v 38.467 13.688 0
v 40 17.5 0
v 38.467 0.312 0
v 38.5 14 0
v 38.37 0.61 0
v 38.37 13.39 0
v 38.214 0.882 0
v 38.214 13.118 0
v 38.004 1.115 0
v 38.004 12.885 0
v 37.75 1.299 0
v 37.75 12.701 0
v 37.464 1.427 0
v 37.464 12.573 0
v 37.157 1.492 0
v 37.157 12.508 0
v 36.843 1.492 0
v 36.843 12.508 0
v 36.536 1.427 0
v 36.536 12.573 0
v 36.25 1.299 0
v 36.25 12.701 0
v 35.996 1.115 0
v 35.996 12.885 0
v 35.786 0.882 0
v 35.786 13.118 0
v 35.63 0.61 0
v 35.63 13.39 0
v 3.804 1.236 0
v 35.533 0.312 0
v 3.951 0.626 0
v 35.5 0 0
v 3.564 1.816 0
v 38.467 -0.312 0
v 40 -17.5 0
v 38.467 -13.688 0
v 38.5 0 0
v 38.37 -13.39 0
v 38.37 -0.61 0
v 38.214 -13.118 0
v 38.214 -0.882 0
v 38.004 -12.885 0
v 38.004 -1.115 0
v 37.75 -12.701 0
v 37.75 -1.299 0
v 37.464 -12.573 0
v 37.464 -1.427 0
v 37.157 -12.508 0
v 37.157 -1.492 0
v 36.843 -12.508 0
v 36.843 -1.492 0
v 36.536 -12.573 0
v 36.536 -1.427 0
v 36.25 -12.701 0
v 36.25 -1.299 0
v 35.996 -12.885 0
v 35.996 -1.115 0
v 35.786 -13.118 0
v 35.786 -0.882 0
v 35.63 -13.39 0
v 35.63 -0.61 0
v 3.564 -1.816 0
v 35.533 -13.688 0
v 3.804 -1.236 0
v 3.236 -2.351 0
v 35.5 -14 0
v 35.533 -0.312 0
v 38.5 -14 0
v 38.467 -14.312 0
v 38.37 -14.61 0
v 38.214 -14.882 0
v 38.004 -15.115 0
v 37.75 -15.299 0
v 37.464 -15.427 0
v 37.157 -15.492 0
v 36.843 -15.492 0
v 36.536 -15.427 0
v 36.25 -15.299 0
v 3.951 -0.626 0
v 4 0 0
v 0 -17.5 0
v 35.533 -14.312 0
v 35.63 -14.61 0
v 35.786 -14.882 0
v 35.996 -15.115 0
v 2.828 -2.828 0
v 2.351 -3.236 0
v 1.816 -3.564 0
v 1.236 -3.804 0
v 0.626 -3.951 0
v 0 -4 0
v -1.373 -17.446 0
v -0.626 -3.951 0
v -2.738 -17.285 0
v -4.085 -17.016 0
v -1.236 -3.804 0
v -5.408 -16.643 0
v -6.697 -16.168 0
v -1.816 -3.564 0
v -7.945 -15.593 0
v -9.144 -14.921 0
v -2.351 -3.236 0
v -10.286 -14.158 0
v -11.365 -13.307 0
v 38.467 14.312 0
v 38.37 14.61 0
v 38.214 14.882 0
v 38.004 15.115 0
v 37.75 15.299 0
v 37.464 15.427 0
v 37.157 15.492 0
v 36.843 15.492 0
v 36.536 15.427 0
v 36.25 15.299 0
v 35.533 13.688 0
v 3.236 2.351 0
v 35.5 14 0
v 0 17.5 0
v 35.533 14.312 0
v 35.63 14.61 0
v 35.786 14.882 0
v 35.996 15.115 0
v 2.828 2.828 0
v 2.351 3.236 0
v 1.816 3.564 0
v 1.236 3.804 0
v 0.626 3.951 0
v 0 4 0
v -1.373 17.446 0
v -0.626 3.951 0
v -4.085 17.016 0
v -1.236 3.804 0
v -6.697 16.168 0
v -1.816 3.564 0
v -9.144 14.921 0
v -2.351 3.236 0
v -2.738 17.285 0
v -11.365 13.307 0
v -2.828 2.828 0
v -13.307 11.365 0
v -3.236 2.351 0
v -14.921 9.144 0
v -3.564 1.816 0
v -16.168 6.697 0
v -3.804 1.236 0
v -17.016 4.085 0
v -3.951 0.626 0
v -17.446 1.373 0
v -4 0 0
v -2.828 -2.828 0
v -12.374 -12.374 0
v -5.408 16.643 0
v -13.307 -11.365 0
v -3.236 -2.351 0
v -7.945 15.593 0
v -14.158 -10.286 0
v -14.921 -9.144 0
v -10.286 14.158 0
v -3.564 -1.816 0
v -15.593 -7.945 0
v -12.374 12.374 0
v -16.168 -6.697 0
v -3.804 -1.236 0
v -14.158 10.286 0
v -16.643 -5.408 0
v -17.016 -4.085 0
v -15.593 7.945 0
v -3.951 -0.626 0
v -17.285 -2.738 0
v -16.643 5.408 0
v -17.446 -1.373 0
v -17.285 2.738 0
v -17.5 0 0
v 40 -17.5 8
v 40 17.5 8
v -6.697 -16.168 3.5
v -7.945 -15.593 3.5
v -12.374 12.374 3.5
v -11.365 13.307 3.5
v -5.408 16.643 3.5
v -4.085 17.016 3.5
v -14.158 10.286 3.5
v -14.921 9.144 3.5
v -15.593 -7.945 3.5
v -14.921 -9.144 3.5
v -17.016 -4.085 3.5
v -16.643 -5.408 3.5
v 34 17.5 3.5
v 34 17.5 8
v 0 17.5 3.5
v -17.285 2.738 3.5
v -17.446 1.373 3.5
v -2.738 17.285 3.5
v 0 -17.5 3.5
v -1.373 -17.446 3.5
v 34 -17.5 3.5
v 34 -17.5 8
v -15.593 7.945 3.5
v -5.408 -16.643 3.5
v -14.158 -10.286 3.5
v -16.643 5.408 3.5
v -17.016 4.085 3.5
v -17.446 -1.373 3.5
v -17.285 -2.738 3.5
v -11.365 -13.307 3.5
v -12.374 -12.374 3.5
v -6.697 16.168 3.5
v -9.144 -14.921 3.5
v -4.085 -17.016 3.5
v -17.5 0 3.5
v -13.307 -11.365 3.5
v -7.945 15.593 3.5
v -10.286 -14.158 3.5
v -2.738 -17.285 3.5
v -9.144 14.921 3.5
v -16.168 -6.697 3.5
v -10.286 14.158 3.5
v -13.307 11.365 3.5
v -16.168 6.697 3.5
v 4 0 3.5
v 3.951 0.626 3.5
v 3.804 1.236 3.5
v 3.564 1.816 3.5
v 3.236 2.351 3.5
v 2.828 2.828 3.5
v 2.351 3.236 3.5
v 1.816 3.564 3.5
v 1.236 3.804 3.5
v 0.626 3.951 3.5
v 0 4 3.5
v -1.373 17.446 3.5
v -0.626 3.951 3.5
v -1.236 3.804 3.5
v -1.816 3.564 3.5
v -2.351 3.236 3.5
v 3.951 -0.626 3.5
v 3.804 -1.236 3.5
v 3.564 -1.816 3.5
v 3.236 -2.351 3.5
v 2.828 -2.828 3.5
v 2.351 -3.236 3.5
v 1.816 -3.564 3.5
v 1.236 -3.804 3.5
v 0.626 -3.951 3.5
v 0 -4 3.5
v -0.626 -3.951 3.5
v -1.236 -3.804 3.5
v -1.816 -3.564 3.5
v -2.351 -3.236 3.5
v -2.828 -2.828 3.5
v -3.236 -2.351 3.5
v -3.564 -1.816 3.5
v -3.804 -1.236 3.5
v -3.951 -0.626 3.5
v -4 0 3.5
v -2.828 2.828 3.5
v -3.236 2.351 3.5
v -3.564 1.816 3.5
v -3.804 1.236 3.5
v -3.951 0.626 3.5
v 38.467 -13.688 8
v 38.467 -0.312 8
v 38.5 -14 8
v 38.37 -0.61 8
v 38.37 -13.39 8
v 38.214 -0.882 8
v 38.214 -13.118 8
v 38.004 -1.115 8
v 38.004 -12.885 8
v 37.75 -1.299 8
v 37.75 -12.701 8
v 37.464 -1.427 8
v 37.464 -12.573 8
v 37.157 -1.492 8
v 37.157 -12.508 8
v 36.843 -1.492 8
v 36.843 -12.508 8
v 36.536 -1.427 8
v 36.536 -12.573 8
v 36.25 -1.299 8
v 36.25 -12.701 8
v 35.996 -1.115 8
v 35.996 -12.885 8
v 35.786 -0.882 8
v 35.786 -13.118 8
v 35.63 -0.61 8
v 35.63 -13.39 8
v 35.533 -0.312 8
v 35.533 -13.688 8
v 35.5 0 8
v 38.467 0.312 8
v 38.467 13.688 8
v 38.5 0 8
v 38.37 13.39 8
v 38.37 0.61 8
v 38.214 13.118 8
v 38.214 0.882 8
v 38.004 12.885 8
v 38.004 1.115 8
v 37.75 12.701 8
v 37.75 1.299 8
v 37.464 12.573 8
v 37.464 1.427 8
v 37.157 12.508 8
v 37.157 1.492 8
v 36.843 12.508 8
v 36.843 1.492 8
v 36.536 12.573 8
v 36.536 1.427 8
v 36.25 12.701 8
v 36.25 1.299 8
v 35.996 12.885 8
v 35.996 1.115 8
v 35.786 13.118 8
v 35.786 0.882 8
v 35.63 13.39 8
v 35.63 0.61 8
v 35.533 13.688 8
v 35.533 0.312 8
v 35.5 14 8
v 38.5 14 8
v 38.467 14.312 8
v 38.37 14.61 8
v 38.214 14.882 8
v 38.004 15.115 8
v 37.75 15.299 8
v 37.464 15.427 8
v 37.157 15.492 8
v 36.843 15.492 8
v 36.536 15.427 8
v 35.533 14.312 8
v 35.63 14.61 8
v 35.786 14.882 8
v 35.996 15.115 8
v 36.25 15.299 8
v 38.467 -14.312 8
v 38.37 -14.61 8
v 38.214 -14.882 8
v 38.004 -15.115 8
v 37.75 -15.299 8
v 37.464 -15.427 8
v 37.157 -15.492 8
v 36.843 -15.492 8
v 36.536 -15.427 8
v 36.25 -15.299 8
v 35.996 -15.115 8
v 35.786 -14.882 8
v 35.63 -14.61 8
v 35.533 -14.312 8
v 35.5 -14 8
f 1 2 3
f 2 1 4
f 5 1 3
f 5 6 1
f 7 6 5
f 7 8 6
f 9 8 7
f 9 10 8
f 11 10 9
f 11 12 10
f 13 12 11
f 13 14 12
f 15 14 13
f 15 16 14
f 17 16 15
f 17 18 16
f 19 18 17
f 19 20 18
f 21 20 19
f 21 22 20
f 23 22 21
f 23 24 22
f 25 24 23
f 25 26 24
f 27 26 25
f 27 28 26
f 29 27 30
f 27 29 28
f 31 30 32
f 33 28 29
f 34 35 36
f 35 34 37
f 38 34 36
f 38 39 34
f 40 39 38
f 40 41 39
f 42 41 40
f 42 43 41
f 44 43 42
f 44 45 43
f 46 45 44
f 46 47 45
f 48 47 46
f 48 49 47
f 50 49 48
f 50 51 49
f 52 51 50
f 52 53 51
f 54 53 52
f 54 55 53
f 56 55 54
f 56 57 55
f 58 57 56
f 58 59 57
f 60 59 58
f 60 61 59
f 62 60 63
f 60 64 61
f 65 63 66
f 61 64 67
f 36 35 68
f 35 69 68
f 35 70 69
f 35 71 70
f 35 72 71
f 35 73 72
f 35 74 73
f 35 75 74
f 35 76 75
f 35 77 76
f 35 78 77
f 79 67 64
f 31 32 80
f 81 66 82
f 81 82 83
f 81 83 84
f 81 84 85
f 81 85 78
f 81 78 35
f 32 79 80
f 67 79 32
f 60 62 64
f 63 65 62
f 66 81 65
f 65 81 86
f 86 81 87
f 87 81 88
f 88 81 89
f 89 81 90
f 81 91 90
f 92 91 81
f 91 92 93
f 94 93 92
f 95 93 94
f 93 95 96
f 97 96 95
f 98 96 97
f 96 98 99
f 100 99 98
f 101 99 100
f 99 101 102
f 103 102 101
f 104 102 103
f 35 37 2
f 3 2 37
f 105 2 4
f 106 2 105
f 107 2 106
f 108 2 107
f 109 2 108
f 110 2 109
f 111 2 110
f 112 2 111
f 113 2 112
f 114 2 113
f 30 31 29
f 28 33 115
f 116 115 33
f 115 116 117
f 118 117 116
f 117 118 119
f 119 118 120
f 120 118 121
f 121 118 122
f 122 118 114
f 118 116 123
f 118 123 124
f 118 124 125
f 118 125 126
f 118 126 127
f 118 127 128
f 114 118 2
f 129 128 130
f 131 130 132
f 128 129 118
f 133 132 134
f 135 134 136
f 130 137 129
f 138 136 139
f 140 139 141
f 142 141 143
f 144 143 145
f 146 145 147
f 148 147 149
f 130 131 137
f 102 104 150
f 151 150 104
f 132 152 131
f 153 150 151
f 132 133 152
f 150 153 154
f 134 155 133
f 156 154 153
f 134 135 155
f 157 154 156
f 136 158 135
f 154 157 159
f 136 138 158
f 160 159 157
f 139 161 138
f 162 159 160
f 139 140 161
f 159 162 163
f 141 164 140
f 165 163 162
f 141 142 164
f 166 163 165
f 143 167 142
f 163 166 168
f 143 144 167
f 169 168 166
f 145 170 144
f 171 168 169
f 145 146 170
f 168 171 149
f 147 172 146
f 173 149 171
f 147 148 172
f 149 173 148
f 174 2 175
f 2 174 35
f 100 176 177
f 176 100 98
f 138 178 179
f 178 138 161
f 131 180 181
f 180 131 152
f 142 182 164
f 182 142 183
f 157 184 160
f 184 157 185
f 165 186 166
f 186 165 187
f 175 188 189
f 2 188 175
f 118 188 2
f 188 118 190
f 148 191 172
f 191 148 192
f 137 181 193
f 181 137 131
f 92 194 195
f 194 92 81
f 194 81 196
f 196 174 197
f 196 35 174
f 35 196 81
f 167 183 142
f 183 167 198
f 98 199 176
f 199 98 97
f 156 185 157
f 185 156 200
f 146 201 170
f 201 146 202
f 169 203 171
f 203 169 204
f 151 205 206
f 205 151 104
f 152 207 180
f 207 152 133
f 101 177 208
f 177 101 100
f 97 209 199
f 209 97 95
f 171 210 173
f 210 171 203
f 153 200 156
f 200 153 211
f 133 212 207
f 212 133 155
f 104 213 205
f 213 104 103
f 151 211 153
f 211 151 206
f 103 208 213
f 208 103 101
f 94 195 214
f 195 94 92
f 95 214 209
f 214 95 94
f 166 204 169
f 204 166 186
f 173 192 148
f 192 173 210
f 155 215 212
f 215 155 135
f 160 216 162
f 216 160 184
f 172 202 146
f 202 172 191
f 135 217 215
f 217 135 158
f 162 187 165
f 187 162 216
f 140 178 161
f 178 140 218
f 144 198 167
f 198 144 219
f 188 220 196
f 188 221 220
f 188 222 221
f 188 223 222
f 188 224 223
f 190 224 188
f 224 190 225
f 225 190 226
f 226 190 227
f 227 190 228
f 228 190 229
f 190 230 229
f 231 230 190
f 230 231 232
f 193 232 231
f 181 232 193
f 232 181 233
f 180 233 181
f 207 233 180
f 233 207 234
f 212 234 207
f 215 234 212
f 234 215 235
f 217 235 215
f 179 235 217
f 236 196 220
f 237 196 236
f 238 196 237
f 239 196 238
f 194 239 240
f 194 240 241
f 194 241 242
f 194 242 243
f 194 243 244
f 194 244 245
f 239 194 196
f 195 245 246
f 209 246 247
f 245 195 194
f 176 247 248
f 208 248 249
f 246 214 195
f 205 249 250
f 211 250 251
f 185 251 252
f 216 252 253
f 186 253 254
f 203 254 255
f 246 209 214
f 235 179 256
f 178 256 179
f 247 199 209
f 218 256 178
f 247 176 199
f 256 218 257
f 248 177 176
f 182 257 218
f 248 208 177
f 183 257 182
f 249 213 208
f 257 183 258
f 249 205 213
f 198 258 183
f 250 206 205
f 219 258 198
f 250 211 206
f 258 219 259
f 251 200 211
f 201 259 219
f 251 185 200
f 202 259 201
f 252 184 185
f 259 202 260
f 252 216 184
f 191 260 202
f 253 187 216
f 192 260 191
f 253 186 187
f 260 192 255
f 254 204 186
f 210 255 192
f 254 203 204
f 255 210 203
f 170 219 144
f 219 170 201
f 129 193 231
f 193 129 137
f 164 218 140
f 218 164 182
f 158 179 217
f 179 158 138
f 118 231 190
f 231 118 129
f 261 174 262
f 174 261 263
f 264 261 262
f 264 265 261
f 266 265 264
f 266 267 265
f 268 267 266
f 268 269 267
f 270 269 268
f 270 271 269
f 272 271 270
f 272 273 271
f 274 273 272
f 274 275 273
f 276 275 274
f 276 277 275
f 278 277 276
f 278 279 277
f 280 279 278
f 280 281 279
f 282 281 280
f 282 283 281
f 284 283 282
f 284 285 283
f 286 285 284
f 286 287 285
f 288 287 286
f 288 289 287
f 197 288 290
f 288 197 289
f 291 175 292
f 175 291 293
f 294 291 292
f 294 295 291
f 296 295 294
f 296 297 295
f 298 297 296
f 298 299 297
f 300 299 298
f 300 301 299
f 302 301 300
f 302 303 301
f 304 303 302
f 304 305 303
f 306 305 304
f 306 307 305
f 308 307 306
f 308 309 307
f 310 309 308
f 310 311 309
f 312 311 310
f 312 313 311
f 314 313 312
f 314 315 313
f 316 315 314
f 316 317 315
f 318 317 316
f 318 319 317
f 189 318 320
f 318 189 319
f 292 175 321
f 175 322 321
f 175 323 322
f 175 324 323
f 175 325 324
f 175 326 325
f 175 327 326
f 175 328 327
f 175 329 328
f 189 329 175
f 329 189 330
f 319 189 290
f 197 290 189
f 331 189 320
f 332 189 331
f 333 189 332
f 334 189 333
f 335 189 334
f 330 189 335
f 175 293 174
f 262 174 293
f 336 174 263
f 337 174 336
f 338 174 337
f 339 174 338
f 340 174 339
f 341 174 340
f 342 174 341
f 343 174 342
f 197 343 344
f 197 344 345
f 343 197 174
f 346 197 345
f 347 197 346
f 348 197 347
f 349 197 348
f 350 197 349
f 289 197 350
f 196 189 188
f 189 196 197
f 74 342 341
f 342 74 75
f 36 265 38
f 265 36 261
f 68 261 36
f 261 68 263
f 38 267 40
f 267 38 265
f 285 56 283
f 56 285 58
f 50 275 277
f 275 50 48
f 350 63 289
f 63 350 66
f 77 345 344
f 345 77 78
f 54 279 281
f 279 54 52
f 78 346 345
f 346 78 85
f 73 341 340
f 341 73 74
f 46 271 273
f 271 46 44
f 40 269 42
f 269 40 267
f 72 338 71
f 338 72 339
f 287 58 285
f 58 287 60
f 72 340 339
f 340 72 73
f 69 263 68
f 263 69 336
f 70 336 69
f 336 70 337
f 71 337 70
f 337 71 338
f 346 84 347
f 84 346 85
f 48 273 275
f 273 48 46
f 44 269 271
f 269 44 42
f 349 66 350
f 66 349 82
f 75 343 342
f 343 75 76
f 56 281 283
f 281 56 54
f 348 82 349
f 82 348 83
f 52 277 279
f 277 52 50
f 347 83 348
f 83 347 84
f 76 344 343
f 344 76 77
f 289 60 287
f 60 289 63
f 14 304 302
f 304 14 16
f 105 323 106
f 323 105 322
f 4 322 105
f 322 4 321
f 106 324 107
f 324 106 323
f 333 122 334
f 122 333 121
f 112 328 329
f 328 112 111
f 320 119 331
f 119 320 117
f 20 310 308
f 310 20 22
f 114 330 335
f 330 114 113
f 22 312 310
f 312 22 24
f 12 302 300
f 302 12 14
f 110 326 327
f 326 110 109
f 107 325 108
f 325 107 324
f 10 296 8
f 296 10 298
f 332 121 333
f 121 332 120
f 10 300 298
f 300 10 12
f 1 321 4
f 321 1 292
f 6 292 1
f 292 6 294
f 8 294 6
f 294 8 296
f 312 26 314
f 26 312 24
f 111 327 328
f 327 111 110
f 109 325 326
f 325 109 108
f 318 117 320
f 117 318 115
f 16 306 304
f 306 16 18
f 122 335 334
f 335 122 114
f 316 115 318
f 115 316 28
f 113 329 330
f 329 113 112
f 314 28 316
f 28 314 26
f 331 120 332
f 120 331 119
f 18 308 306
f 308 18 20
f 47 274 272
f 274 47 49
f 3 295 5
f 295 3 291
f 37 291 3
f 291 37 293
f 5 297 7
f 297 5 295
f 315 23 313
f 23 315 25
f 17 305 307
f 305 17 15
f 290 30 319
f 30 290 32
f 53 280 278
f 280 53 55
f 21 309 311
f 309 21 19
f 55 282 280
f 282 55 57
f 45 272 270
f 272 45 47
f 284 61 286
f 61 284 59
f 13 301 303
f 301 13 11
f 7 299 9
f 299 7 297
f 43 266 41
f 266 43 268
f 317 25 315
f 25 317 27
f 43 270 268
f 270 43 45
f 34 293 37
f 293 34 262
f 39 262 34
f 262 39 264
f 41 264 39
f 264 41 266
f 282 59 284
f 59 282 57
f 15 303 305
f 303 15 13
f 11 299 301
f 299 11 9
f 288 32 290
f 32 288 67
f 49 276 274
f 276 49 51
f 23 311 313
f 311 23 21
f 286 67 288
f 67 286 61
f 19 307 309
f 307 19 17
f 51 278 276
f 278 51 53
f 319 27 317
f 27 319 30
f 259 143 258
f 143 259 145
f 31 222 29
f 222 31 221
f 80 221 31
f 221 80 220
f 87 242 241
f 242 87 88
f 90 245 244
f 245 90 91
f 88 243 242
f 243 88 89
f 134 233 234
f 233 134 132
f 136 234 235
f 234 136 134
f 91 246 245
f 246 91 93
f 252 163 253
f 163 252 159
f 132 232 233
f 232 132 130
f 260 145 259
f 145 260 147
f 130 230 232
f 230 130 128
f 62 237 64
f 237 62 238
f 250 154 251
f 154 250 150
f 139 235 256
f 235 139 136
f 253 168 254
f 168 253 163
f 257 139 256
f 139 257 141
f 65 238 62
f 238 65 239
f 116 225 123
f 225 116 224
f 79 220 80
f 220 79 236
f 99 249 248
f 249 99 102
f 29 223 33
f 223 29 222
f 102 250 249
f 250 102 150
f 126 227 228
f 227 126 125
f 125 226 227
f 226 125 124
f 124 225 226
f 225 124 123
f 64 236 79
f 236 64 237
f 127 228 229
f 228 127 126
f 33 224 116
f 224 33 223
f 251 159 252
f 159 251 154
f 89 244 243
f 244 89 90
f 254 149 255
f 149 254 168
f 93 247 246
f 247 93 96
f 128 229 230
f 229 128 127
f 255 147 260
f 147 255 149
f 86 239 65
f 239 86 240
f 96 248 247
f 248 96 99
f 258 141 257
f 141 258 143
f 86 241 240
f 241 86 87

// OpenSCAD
difference(){
  union(){
    linear_extrude(3.5) {
      circle(d=35,$fn=80);
      translate([0,-17.5,0]) square([40,35]);
    }
    translate([34,-17.5]) cube([6,35,8]);
  }
  translate([0,0,-.01]) cylinder(d=8,h=4.02,$fn=40);
  for(y=[-14,14,0])
    translate([37,y,-.01]) cylinder(d=3,h=10.02,$fn=30);
}
